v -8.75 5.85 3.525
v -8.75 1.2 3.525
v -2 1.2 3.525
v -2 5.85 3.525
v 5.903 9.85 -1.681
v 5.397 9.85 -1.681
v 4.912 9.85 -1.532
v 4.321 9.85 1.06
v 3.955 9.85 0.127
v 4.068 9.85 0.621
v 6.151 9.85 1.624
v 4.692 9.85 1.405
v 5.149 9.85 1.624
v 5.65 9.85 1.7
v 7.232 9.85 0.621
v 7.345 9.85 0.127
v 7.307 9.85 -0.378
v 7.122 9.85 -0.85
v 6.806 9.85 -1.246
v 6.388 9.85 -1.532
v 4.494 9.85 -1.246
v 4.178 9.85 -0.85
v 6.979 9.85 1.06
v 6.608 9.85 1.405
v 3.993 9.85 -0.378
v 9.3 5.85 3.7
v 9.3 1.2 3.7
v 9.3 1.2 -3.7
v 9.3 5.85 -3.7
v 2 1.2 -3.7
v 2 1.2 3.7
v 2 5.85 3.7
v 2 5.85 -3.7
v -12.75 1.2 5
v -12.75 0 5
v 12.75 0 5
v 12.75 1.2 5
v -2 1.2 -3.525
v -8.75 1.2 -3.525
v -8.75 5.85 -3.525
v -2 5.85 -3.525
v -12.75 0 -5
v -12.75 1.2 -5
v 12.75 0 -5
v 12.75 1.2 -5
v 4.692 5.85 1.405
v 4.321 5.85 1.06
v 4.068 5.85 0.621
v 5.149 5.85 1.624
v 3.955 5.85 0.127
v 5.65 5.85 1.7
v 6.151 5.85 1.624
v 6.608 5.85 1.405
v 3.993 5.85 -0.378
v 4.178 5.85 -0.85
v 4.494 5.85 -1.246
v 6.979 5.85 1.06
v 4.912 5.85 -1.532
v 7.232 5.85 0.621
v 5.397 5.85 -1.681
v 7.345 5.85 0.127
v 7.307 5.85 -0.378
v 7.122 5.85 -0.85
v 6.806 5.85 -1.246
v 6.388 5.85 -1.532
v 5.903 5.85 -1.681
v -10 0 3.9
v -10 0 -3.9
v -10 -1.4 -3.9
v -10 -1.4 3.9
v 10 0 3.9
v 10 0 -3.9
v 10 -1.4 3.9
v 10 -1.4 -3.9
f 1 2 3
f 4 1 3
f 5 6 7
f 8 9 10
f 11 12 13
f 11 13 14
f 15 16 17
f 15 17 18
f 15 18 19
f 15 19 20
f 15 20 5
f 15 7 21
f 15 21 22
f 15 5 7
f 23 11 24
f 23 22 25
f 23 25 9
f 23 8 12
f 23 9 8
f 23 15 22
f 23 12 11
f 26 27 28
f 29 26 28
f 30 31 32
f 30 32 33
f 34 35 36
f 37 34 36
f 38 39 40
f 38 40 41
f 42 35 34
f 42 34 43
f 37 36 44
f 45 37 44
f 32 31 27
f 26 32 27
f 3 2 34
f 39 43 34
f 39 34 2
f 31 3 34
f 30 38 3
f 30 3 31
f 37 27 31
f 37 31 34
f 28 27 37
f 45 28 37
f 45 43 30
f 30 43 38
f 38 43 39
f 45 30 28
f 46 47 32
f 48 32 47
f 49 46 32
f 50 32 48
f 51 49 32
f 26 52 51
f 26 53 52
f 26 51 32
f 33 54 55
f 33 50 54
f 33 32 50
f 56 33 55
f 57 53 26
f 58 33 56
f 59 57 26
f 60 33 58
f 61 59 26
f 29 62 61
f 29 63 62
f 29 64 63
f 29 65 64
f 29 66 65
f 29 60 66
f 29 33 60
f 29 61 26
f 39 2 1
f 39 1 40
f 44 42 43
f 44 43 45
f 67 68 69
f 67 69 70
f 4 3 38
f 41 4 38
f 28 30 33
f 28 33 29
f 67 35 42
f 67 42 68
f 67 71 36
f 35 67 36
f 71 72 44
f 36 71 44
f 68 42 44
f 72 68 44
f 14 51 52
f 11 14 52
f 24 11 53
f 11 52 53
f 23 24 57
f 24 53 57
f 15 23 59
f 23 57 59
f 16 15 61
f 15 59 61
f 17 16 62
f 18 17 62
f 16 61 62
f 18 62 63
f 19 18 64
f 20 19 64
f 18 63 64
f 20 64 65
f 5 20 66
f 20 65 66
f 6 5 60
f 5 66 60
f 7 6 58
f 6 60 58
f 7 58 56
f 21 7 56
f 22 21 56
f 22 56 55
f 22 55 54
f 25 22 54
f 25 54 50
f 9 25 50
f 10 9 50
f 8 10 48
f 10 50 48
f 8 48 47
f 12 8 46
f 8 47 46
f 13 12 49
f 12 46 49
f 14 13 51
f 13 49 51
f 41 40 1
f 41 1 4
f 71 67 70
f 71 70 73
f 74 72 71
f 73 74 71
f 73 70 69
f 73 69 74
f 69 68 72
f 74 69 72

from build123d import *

# Parameters (mm, degrees)
SKETCH2_W           = 25.5
SKETCH2_H           = 10
BOSS_EXTRUDE1_DEPTH = 1.2
SKETCH4_W           = 6.75
SKETCH4_H           = 7.05
SKETCH4_W_2         = 7.3
SKETCH4_H_2         = 7.4
BOSS_EXTRUDE2_DEPTH = 4.65
SKETCH5_R           = 1.7
BOSS_EXTRUDE3_DEPTH = 4
SKETCH6_W           = 20
SKETCH6_H           = 7.8
BOSS_EXTRUDE4_DEPTH = 1.4


with BuildPart() as part:
    # Sketch2 → Boss-Extrude1 (new body)
    with BuildSketch(Plane(origin=(0, 0, 0), x_dir=(1, 0, 0), z_dir=(0, 1, 0))):
        Rectangle(SKETCH2_W, SKETCH2_H)
    extrude(amount=BOSS_EXTRUDE1_DEPTH)

    # Sketch4 → Boss-Extrude2 (add)
    with BuildSketch(Plane(origin=(0, 1.2, 0), x_dir=(1, 0, 0), z_dir=(0, 1, 0))):
        with Locations((-5.375, 0)):
            Rectangle(SKETCH4_W, SKETCH4_H)
        with Locations((5.65, 0)):
            Rectangle(SKETCH4_W_2, SKETCH4_H_2)
    extrude(amount=BOSS_EXTRUDE2_DEPTH)

    # Sketch5 → Boss-Extrude3 (add)
    with BuildSketch(Plane(origin=(0, 5.85, 0), x_dir=(1, 0, 0), z_dir=(0, 1, 0))):
        with Locations(Location((5.65, 0, 0), (0, 0, 270))):
            Circle(SKETCH5_R)
    extrude(amount=BOSS_EXTRUDE3_DEPTH)

    # Sketch6 → Boss-Extrude4 (add)
    with BuildSketch(Plane.XZ):
        Rectangle(SKETCH6_W, SKETCH6_H)
    extrude(amount=BOSS_EXTRUDE4_DEPTH)


solid = part.part
